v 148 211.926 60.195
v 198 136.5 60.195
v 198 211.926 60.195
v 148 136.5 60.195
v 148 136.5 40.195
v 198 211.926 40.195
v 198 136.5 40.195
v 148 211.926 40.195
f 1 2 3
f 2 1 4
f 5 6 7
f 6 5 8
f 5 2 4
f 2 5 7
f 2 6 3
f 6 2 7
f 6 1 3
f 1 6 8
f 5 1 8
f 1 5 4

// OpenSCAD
// Generated from the same CSG operations as STEP. Rebuild with spec/build_parent_hand_service.py.
translate([148.0,136.5,40.195]) cube([50.0,75.42587500000002,20.0]);
